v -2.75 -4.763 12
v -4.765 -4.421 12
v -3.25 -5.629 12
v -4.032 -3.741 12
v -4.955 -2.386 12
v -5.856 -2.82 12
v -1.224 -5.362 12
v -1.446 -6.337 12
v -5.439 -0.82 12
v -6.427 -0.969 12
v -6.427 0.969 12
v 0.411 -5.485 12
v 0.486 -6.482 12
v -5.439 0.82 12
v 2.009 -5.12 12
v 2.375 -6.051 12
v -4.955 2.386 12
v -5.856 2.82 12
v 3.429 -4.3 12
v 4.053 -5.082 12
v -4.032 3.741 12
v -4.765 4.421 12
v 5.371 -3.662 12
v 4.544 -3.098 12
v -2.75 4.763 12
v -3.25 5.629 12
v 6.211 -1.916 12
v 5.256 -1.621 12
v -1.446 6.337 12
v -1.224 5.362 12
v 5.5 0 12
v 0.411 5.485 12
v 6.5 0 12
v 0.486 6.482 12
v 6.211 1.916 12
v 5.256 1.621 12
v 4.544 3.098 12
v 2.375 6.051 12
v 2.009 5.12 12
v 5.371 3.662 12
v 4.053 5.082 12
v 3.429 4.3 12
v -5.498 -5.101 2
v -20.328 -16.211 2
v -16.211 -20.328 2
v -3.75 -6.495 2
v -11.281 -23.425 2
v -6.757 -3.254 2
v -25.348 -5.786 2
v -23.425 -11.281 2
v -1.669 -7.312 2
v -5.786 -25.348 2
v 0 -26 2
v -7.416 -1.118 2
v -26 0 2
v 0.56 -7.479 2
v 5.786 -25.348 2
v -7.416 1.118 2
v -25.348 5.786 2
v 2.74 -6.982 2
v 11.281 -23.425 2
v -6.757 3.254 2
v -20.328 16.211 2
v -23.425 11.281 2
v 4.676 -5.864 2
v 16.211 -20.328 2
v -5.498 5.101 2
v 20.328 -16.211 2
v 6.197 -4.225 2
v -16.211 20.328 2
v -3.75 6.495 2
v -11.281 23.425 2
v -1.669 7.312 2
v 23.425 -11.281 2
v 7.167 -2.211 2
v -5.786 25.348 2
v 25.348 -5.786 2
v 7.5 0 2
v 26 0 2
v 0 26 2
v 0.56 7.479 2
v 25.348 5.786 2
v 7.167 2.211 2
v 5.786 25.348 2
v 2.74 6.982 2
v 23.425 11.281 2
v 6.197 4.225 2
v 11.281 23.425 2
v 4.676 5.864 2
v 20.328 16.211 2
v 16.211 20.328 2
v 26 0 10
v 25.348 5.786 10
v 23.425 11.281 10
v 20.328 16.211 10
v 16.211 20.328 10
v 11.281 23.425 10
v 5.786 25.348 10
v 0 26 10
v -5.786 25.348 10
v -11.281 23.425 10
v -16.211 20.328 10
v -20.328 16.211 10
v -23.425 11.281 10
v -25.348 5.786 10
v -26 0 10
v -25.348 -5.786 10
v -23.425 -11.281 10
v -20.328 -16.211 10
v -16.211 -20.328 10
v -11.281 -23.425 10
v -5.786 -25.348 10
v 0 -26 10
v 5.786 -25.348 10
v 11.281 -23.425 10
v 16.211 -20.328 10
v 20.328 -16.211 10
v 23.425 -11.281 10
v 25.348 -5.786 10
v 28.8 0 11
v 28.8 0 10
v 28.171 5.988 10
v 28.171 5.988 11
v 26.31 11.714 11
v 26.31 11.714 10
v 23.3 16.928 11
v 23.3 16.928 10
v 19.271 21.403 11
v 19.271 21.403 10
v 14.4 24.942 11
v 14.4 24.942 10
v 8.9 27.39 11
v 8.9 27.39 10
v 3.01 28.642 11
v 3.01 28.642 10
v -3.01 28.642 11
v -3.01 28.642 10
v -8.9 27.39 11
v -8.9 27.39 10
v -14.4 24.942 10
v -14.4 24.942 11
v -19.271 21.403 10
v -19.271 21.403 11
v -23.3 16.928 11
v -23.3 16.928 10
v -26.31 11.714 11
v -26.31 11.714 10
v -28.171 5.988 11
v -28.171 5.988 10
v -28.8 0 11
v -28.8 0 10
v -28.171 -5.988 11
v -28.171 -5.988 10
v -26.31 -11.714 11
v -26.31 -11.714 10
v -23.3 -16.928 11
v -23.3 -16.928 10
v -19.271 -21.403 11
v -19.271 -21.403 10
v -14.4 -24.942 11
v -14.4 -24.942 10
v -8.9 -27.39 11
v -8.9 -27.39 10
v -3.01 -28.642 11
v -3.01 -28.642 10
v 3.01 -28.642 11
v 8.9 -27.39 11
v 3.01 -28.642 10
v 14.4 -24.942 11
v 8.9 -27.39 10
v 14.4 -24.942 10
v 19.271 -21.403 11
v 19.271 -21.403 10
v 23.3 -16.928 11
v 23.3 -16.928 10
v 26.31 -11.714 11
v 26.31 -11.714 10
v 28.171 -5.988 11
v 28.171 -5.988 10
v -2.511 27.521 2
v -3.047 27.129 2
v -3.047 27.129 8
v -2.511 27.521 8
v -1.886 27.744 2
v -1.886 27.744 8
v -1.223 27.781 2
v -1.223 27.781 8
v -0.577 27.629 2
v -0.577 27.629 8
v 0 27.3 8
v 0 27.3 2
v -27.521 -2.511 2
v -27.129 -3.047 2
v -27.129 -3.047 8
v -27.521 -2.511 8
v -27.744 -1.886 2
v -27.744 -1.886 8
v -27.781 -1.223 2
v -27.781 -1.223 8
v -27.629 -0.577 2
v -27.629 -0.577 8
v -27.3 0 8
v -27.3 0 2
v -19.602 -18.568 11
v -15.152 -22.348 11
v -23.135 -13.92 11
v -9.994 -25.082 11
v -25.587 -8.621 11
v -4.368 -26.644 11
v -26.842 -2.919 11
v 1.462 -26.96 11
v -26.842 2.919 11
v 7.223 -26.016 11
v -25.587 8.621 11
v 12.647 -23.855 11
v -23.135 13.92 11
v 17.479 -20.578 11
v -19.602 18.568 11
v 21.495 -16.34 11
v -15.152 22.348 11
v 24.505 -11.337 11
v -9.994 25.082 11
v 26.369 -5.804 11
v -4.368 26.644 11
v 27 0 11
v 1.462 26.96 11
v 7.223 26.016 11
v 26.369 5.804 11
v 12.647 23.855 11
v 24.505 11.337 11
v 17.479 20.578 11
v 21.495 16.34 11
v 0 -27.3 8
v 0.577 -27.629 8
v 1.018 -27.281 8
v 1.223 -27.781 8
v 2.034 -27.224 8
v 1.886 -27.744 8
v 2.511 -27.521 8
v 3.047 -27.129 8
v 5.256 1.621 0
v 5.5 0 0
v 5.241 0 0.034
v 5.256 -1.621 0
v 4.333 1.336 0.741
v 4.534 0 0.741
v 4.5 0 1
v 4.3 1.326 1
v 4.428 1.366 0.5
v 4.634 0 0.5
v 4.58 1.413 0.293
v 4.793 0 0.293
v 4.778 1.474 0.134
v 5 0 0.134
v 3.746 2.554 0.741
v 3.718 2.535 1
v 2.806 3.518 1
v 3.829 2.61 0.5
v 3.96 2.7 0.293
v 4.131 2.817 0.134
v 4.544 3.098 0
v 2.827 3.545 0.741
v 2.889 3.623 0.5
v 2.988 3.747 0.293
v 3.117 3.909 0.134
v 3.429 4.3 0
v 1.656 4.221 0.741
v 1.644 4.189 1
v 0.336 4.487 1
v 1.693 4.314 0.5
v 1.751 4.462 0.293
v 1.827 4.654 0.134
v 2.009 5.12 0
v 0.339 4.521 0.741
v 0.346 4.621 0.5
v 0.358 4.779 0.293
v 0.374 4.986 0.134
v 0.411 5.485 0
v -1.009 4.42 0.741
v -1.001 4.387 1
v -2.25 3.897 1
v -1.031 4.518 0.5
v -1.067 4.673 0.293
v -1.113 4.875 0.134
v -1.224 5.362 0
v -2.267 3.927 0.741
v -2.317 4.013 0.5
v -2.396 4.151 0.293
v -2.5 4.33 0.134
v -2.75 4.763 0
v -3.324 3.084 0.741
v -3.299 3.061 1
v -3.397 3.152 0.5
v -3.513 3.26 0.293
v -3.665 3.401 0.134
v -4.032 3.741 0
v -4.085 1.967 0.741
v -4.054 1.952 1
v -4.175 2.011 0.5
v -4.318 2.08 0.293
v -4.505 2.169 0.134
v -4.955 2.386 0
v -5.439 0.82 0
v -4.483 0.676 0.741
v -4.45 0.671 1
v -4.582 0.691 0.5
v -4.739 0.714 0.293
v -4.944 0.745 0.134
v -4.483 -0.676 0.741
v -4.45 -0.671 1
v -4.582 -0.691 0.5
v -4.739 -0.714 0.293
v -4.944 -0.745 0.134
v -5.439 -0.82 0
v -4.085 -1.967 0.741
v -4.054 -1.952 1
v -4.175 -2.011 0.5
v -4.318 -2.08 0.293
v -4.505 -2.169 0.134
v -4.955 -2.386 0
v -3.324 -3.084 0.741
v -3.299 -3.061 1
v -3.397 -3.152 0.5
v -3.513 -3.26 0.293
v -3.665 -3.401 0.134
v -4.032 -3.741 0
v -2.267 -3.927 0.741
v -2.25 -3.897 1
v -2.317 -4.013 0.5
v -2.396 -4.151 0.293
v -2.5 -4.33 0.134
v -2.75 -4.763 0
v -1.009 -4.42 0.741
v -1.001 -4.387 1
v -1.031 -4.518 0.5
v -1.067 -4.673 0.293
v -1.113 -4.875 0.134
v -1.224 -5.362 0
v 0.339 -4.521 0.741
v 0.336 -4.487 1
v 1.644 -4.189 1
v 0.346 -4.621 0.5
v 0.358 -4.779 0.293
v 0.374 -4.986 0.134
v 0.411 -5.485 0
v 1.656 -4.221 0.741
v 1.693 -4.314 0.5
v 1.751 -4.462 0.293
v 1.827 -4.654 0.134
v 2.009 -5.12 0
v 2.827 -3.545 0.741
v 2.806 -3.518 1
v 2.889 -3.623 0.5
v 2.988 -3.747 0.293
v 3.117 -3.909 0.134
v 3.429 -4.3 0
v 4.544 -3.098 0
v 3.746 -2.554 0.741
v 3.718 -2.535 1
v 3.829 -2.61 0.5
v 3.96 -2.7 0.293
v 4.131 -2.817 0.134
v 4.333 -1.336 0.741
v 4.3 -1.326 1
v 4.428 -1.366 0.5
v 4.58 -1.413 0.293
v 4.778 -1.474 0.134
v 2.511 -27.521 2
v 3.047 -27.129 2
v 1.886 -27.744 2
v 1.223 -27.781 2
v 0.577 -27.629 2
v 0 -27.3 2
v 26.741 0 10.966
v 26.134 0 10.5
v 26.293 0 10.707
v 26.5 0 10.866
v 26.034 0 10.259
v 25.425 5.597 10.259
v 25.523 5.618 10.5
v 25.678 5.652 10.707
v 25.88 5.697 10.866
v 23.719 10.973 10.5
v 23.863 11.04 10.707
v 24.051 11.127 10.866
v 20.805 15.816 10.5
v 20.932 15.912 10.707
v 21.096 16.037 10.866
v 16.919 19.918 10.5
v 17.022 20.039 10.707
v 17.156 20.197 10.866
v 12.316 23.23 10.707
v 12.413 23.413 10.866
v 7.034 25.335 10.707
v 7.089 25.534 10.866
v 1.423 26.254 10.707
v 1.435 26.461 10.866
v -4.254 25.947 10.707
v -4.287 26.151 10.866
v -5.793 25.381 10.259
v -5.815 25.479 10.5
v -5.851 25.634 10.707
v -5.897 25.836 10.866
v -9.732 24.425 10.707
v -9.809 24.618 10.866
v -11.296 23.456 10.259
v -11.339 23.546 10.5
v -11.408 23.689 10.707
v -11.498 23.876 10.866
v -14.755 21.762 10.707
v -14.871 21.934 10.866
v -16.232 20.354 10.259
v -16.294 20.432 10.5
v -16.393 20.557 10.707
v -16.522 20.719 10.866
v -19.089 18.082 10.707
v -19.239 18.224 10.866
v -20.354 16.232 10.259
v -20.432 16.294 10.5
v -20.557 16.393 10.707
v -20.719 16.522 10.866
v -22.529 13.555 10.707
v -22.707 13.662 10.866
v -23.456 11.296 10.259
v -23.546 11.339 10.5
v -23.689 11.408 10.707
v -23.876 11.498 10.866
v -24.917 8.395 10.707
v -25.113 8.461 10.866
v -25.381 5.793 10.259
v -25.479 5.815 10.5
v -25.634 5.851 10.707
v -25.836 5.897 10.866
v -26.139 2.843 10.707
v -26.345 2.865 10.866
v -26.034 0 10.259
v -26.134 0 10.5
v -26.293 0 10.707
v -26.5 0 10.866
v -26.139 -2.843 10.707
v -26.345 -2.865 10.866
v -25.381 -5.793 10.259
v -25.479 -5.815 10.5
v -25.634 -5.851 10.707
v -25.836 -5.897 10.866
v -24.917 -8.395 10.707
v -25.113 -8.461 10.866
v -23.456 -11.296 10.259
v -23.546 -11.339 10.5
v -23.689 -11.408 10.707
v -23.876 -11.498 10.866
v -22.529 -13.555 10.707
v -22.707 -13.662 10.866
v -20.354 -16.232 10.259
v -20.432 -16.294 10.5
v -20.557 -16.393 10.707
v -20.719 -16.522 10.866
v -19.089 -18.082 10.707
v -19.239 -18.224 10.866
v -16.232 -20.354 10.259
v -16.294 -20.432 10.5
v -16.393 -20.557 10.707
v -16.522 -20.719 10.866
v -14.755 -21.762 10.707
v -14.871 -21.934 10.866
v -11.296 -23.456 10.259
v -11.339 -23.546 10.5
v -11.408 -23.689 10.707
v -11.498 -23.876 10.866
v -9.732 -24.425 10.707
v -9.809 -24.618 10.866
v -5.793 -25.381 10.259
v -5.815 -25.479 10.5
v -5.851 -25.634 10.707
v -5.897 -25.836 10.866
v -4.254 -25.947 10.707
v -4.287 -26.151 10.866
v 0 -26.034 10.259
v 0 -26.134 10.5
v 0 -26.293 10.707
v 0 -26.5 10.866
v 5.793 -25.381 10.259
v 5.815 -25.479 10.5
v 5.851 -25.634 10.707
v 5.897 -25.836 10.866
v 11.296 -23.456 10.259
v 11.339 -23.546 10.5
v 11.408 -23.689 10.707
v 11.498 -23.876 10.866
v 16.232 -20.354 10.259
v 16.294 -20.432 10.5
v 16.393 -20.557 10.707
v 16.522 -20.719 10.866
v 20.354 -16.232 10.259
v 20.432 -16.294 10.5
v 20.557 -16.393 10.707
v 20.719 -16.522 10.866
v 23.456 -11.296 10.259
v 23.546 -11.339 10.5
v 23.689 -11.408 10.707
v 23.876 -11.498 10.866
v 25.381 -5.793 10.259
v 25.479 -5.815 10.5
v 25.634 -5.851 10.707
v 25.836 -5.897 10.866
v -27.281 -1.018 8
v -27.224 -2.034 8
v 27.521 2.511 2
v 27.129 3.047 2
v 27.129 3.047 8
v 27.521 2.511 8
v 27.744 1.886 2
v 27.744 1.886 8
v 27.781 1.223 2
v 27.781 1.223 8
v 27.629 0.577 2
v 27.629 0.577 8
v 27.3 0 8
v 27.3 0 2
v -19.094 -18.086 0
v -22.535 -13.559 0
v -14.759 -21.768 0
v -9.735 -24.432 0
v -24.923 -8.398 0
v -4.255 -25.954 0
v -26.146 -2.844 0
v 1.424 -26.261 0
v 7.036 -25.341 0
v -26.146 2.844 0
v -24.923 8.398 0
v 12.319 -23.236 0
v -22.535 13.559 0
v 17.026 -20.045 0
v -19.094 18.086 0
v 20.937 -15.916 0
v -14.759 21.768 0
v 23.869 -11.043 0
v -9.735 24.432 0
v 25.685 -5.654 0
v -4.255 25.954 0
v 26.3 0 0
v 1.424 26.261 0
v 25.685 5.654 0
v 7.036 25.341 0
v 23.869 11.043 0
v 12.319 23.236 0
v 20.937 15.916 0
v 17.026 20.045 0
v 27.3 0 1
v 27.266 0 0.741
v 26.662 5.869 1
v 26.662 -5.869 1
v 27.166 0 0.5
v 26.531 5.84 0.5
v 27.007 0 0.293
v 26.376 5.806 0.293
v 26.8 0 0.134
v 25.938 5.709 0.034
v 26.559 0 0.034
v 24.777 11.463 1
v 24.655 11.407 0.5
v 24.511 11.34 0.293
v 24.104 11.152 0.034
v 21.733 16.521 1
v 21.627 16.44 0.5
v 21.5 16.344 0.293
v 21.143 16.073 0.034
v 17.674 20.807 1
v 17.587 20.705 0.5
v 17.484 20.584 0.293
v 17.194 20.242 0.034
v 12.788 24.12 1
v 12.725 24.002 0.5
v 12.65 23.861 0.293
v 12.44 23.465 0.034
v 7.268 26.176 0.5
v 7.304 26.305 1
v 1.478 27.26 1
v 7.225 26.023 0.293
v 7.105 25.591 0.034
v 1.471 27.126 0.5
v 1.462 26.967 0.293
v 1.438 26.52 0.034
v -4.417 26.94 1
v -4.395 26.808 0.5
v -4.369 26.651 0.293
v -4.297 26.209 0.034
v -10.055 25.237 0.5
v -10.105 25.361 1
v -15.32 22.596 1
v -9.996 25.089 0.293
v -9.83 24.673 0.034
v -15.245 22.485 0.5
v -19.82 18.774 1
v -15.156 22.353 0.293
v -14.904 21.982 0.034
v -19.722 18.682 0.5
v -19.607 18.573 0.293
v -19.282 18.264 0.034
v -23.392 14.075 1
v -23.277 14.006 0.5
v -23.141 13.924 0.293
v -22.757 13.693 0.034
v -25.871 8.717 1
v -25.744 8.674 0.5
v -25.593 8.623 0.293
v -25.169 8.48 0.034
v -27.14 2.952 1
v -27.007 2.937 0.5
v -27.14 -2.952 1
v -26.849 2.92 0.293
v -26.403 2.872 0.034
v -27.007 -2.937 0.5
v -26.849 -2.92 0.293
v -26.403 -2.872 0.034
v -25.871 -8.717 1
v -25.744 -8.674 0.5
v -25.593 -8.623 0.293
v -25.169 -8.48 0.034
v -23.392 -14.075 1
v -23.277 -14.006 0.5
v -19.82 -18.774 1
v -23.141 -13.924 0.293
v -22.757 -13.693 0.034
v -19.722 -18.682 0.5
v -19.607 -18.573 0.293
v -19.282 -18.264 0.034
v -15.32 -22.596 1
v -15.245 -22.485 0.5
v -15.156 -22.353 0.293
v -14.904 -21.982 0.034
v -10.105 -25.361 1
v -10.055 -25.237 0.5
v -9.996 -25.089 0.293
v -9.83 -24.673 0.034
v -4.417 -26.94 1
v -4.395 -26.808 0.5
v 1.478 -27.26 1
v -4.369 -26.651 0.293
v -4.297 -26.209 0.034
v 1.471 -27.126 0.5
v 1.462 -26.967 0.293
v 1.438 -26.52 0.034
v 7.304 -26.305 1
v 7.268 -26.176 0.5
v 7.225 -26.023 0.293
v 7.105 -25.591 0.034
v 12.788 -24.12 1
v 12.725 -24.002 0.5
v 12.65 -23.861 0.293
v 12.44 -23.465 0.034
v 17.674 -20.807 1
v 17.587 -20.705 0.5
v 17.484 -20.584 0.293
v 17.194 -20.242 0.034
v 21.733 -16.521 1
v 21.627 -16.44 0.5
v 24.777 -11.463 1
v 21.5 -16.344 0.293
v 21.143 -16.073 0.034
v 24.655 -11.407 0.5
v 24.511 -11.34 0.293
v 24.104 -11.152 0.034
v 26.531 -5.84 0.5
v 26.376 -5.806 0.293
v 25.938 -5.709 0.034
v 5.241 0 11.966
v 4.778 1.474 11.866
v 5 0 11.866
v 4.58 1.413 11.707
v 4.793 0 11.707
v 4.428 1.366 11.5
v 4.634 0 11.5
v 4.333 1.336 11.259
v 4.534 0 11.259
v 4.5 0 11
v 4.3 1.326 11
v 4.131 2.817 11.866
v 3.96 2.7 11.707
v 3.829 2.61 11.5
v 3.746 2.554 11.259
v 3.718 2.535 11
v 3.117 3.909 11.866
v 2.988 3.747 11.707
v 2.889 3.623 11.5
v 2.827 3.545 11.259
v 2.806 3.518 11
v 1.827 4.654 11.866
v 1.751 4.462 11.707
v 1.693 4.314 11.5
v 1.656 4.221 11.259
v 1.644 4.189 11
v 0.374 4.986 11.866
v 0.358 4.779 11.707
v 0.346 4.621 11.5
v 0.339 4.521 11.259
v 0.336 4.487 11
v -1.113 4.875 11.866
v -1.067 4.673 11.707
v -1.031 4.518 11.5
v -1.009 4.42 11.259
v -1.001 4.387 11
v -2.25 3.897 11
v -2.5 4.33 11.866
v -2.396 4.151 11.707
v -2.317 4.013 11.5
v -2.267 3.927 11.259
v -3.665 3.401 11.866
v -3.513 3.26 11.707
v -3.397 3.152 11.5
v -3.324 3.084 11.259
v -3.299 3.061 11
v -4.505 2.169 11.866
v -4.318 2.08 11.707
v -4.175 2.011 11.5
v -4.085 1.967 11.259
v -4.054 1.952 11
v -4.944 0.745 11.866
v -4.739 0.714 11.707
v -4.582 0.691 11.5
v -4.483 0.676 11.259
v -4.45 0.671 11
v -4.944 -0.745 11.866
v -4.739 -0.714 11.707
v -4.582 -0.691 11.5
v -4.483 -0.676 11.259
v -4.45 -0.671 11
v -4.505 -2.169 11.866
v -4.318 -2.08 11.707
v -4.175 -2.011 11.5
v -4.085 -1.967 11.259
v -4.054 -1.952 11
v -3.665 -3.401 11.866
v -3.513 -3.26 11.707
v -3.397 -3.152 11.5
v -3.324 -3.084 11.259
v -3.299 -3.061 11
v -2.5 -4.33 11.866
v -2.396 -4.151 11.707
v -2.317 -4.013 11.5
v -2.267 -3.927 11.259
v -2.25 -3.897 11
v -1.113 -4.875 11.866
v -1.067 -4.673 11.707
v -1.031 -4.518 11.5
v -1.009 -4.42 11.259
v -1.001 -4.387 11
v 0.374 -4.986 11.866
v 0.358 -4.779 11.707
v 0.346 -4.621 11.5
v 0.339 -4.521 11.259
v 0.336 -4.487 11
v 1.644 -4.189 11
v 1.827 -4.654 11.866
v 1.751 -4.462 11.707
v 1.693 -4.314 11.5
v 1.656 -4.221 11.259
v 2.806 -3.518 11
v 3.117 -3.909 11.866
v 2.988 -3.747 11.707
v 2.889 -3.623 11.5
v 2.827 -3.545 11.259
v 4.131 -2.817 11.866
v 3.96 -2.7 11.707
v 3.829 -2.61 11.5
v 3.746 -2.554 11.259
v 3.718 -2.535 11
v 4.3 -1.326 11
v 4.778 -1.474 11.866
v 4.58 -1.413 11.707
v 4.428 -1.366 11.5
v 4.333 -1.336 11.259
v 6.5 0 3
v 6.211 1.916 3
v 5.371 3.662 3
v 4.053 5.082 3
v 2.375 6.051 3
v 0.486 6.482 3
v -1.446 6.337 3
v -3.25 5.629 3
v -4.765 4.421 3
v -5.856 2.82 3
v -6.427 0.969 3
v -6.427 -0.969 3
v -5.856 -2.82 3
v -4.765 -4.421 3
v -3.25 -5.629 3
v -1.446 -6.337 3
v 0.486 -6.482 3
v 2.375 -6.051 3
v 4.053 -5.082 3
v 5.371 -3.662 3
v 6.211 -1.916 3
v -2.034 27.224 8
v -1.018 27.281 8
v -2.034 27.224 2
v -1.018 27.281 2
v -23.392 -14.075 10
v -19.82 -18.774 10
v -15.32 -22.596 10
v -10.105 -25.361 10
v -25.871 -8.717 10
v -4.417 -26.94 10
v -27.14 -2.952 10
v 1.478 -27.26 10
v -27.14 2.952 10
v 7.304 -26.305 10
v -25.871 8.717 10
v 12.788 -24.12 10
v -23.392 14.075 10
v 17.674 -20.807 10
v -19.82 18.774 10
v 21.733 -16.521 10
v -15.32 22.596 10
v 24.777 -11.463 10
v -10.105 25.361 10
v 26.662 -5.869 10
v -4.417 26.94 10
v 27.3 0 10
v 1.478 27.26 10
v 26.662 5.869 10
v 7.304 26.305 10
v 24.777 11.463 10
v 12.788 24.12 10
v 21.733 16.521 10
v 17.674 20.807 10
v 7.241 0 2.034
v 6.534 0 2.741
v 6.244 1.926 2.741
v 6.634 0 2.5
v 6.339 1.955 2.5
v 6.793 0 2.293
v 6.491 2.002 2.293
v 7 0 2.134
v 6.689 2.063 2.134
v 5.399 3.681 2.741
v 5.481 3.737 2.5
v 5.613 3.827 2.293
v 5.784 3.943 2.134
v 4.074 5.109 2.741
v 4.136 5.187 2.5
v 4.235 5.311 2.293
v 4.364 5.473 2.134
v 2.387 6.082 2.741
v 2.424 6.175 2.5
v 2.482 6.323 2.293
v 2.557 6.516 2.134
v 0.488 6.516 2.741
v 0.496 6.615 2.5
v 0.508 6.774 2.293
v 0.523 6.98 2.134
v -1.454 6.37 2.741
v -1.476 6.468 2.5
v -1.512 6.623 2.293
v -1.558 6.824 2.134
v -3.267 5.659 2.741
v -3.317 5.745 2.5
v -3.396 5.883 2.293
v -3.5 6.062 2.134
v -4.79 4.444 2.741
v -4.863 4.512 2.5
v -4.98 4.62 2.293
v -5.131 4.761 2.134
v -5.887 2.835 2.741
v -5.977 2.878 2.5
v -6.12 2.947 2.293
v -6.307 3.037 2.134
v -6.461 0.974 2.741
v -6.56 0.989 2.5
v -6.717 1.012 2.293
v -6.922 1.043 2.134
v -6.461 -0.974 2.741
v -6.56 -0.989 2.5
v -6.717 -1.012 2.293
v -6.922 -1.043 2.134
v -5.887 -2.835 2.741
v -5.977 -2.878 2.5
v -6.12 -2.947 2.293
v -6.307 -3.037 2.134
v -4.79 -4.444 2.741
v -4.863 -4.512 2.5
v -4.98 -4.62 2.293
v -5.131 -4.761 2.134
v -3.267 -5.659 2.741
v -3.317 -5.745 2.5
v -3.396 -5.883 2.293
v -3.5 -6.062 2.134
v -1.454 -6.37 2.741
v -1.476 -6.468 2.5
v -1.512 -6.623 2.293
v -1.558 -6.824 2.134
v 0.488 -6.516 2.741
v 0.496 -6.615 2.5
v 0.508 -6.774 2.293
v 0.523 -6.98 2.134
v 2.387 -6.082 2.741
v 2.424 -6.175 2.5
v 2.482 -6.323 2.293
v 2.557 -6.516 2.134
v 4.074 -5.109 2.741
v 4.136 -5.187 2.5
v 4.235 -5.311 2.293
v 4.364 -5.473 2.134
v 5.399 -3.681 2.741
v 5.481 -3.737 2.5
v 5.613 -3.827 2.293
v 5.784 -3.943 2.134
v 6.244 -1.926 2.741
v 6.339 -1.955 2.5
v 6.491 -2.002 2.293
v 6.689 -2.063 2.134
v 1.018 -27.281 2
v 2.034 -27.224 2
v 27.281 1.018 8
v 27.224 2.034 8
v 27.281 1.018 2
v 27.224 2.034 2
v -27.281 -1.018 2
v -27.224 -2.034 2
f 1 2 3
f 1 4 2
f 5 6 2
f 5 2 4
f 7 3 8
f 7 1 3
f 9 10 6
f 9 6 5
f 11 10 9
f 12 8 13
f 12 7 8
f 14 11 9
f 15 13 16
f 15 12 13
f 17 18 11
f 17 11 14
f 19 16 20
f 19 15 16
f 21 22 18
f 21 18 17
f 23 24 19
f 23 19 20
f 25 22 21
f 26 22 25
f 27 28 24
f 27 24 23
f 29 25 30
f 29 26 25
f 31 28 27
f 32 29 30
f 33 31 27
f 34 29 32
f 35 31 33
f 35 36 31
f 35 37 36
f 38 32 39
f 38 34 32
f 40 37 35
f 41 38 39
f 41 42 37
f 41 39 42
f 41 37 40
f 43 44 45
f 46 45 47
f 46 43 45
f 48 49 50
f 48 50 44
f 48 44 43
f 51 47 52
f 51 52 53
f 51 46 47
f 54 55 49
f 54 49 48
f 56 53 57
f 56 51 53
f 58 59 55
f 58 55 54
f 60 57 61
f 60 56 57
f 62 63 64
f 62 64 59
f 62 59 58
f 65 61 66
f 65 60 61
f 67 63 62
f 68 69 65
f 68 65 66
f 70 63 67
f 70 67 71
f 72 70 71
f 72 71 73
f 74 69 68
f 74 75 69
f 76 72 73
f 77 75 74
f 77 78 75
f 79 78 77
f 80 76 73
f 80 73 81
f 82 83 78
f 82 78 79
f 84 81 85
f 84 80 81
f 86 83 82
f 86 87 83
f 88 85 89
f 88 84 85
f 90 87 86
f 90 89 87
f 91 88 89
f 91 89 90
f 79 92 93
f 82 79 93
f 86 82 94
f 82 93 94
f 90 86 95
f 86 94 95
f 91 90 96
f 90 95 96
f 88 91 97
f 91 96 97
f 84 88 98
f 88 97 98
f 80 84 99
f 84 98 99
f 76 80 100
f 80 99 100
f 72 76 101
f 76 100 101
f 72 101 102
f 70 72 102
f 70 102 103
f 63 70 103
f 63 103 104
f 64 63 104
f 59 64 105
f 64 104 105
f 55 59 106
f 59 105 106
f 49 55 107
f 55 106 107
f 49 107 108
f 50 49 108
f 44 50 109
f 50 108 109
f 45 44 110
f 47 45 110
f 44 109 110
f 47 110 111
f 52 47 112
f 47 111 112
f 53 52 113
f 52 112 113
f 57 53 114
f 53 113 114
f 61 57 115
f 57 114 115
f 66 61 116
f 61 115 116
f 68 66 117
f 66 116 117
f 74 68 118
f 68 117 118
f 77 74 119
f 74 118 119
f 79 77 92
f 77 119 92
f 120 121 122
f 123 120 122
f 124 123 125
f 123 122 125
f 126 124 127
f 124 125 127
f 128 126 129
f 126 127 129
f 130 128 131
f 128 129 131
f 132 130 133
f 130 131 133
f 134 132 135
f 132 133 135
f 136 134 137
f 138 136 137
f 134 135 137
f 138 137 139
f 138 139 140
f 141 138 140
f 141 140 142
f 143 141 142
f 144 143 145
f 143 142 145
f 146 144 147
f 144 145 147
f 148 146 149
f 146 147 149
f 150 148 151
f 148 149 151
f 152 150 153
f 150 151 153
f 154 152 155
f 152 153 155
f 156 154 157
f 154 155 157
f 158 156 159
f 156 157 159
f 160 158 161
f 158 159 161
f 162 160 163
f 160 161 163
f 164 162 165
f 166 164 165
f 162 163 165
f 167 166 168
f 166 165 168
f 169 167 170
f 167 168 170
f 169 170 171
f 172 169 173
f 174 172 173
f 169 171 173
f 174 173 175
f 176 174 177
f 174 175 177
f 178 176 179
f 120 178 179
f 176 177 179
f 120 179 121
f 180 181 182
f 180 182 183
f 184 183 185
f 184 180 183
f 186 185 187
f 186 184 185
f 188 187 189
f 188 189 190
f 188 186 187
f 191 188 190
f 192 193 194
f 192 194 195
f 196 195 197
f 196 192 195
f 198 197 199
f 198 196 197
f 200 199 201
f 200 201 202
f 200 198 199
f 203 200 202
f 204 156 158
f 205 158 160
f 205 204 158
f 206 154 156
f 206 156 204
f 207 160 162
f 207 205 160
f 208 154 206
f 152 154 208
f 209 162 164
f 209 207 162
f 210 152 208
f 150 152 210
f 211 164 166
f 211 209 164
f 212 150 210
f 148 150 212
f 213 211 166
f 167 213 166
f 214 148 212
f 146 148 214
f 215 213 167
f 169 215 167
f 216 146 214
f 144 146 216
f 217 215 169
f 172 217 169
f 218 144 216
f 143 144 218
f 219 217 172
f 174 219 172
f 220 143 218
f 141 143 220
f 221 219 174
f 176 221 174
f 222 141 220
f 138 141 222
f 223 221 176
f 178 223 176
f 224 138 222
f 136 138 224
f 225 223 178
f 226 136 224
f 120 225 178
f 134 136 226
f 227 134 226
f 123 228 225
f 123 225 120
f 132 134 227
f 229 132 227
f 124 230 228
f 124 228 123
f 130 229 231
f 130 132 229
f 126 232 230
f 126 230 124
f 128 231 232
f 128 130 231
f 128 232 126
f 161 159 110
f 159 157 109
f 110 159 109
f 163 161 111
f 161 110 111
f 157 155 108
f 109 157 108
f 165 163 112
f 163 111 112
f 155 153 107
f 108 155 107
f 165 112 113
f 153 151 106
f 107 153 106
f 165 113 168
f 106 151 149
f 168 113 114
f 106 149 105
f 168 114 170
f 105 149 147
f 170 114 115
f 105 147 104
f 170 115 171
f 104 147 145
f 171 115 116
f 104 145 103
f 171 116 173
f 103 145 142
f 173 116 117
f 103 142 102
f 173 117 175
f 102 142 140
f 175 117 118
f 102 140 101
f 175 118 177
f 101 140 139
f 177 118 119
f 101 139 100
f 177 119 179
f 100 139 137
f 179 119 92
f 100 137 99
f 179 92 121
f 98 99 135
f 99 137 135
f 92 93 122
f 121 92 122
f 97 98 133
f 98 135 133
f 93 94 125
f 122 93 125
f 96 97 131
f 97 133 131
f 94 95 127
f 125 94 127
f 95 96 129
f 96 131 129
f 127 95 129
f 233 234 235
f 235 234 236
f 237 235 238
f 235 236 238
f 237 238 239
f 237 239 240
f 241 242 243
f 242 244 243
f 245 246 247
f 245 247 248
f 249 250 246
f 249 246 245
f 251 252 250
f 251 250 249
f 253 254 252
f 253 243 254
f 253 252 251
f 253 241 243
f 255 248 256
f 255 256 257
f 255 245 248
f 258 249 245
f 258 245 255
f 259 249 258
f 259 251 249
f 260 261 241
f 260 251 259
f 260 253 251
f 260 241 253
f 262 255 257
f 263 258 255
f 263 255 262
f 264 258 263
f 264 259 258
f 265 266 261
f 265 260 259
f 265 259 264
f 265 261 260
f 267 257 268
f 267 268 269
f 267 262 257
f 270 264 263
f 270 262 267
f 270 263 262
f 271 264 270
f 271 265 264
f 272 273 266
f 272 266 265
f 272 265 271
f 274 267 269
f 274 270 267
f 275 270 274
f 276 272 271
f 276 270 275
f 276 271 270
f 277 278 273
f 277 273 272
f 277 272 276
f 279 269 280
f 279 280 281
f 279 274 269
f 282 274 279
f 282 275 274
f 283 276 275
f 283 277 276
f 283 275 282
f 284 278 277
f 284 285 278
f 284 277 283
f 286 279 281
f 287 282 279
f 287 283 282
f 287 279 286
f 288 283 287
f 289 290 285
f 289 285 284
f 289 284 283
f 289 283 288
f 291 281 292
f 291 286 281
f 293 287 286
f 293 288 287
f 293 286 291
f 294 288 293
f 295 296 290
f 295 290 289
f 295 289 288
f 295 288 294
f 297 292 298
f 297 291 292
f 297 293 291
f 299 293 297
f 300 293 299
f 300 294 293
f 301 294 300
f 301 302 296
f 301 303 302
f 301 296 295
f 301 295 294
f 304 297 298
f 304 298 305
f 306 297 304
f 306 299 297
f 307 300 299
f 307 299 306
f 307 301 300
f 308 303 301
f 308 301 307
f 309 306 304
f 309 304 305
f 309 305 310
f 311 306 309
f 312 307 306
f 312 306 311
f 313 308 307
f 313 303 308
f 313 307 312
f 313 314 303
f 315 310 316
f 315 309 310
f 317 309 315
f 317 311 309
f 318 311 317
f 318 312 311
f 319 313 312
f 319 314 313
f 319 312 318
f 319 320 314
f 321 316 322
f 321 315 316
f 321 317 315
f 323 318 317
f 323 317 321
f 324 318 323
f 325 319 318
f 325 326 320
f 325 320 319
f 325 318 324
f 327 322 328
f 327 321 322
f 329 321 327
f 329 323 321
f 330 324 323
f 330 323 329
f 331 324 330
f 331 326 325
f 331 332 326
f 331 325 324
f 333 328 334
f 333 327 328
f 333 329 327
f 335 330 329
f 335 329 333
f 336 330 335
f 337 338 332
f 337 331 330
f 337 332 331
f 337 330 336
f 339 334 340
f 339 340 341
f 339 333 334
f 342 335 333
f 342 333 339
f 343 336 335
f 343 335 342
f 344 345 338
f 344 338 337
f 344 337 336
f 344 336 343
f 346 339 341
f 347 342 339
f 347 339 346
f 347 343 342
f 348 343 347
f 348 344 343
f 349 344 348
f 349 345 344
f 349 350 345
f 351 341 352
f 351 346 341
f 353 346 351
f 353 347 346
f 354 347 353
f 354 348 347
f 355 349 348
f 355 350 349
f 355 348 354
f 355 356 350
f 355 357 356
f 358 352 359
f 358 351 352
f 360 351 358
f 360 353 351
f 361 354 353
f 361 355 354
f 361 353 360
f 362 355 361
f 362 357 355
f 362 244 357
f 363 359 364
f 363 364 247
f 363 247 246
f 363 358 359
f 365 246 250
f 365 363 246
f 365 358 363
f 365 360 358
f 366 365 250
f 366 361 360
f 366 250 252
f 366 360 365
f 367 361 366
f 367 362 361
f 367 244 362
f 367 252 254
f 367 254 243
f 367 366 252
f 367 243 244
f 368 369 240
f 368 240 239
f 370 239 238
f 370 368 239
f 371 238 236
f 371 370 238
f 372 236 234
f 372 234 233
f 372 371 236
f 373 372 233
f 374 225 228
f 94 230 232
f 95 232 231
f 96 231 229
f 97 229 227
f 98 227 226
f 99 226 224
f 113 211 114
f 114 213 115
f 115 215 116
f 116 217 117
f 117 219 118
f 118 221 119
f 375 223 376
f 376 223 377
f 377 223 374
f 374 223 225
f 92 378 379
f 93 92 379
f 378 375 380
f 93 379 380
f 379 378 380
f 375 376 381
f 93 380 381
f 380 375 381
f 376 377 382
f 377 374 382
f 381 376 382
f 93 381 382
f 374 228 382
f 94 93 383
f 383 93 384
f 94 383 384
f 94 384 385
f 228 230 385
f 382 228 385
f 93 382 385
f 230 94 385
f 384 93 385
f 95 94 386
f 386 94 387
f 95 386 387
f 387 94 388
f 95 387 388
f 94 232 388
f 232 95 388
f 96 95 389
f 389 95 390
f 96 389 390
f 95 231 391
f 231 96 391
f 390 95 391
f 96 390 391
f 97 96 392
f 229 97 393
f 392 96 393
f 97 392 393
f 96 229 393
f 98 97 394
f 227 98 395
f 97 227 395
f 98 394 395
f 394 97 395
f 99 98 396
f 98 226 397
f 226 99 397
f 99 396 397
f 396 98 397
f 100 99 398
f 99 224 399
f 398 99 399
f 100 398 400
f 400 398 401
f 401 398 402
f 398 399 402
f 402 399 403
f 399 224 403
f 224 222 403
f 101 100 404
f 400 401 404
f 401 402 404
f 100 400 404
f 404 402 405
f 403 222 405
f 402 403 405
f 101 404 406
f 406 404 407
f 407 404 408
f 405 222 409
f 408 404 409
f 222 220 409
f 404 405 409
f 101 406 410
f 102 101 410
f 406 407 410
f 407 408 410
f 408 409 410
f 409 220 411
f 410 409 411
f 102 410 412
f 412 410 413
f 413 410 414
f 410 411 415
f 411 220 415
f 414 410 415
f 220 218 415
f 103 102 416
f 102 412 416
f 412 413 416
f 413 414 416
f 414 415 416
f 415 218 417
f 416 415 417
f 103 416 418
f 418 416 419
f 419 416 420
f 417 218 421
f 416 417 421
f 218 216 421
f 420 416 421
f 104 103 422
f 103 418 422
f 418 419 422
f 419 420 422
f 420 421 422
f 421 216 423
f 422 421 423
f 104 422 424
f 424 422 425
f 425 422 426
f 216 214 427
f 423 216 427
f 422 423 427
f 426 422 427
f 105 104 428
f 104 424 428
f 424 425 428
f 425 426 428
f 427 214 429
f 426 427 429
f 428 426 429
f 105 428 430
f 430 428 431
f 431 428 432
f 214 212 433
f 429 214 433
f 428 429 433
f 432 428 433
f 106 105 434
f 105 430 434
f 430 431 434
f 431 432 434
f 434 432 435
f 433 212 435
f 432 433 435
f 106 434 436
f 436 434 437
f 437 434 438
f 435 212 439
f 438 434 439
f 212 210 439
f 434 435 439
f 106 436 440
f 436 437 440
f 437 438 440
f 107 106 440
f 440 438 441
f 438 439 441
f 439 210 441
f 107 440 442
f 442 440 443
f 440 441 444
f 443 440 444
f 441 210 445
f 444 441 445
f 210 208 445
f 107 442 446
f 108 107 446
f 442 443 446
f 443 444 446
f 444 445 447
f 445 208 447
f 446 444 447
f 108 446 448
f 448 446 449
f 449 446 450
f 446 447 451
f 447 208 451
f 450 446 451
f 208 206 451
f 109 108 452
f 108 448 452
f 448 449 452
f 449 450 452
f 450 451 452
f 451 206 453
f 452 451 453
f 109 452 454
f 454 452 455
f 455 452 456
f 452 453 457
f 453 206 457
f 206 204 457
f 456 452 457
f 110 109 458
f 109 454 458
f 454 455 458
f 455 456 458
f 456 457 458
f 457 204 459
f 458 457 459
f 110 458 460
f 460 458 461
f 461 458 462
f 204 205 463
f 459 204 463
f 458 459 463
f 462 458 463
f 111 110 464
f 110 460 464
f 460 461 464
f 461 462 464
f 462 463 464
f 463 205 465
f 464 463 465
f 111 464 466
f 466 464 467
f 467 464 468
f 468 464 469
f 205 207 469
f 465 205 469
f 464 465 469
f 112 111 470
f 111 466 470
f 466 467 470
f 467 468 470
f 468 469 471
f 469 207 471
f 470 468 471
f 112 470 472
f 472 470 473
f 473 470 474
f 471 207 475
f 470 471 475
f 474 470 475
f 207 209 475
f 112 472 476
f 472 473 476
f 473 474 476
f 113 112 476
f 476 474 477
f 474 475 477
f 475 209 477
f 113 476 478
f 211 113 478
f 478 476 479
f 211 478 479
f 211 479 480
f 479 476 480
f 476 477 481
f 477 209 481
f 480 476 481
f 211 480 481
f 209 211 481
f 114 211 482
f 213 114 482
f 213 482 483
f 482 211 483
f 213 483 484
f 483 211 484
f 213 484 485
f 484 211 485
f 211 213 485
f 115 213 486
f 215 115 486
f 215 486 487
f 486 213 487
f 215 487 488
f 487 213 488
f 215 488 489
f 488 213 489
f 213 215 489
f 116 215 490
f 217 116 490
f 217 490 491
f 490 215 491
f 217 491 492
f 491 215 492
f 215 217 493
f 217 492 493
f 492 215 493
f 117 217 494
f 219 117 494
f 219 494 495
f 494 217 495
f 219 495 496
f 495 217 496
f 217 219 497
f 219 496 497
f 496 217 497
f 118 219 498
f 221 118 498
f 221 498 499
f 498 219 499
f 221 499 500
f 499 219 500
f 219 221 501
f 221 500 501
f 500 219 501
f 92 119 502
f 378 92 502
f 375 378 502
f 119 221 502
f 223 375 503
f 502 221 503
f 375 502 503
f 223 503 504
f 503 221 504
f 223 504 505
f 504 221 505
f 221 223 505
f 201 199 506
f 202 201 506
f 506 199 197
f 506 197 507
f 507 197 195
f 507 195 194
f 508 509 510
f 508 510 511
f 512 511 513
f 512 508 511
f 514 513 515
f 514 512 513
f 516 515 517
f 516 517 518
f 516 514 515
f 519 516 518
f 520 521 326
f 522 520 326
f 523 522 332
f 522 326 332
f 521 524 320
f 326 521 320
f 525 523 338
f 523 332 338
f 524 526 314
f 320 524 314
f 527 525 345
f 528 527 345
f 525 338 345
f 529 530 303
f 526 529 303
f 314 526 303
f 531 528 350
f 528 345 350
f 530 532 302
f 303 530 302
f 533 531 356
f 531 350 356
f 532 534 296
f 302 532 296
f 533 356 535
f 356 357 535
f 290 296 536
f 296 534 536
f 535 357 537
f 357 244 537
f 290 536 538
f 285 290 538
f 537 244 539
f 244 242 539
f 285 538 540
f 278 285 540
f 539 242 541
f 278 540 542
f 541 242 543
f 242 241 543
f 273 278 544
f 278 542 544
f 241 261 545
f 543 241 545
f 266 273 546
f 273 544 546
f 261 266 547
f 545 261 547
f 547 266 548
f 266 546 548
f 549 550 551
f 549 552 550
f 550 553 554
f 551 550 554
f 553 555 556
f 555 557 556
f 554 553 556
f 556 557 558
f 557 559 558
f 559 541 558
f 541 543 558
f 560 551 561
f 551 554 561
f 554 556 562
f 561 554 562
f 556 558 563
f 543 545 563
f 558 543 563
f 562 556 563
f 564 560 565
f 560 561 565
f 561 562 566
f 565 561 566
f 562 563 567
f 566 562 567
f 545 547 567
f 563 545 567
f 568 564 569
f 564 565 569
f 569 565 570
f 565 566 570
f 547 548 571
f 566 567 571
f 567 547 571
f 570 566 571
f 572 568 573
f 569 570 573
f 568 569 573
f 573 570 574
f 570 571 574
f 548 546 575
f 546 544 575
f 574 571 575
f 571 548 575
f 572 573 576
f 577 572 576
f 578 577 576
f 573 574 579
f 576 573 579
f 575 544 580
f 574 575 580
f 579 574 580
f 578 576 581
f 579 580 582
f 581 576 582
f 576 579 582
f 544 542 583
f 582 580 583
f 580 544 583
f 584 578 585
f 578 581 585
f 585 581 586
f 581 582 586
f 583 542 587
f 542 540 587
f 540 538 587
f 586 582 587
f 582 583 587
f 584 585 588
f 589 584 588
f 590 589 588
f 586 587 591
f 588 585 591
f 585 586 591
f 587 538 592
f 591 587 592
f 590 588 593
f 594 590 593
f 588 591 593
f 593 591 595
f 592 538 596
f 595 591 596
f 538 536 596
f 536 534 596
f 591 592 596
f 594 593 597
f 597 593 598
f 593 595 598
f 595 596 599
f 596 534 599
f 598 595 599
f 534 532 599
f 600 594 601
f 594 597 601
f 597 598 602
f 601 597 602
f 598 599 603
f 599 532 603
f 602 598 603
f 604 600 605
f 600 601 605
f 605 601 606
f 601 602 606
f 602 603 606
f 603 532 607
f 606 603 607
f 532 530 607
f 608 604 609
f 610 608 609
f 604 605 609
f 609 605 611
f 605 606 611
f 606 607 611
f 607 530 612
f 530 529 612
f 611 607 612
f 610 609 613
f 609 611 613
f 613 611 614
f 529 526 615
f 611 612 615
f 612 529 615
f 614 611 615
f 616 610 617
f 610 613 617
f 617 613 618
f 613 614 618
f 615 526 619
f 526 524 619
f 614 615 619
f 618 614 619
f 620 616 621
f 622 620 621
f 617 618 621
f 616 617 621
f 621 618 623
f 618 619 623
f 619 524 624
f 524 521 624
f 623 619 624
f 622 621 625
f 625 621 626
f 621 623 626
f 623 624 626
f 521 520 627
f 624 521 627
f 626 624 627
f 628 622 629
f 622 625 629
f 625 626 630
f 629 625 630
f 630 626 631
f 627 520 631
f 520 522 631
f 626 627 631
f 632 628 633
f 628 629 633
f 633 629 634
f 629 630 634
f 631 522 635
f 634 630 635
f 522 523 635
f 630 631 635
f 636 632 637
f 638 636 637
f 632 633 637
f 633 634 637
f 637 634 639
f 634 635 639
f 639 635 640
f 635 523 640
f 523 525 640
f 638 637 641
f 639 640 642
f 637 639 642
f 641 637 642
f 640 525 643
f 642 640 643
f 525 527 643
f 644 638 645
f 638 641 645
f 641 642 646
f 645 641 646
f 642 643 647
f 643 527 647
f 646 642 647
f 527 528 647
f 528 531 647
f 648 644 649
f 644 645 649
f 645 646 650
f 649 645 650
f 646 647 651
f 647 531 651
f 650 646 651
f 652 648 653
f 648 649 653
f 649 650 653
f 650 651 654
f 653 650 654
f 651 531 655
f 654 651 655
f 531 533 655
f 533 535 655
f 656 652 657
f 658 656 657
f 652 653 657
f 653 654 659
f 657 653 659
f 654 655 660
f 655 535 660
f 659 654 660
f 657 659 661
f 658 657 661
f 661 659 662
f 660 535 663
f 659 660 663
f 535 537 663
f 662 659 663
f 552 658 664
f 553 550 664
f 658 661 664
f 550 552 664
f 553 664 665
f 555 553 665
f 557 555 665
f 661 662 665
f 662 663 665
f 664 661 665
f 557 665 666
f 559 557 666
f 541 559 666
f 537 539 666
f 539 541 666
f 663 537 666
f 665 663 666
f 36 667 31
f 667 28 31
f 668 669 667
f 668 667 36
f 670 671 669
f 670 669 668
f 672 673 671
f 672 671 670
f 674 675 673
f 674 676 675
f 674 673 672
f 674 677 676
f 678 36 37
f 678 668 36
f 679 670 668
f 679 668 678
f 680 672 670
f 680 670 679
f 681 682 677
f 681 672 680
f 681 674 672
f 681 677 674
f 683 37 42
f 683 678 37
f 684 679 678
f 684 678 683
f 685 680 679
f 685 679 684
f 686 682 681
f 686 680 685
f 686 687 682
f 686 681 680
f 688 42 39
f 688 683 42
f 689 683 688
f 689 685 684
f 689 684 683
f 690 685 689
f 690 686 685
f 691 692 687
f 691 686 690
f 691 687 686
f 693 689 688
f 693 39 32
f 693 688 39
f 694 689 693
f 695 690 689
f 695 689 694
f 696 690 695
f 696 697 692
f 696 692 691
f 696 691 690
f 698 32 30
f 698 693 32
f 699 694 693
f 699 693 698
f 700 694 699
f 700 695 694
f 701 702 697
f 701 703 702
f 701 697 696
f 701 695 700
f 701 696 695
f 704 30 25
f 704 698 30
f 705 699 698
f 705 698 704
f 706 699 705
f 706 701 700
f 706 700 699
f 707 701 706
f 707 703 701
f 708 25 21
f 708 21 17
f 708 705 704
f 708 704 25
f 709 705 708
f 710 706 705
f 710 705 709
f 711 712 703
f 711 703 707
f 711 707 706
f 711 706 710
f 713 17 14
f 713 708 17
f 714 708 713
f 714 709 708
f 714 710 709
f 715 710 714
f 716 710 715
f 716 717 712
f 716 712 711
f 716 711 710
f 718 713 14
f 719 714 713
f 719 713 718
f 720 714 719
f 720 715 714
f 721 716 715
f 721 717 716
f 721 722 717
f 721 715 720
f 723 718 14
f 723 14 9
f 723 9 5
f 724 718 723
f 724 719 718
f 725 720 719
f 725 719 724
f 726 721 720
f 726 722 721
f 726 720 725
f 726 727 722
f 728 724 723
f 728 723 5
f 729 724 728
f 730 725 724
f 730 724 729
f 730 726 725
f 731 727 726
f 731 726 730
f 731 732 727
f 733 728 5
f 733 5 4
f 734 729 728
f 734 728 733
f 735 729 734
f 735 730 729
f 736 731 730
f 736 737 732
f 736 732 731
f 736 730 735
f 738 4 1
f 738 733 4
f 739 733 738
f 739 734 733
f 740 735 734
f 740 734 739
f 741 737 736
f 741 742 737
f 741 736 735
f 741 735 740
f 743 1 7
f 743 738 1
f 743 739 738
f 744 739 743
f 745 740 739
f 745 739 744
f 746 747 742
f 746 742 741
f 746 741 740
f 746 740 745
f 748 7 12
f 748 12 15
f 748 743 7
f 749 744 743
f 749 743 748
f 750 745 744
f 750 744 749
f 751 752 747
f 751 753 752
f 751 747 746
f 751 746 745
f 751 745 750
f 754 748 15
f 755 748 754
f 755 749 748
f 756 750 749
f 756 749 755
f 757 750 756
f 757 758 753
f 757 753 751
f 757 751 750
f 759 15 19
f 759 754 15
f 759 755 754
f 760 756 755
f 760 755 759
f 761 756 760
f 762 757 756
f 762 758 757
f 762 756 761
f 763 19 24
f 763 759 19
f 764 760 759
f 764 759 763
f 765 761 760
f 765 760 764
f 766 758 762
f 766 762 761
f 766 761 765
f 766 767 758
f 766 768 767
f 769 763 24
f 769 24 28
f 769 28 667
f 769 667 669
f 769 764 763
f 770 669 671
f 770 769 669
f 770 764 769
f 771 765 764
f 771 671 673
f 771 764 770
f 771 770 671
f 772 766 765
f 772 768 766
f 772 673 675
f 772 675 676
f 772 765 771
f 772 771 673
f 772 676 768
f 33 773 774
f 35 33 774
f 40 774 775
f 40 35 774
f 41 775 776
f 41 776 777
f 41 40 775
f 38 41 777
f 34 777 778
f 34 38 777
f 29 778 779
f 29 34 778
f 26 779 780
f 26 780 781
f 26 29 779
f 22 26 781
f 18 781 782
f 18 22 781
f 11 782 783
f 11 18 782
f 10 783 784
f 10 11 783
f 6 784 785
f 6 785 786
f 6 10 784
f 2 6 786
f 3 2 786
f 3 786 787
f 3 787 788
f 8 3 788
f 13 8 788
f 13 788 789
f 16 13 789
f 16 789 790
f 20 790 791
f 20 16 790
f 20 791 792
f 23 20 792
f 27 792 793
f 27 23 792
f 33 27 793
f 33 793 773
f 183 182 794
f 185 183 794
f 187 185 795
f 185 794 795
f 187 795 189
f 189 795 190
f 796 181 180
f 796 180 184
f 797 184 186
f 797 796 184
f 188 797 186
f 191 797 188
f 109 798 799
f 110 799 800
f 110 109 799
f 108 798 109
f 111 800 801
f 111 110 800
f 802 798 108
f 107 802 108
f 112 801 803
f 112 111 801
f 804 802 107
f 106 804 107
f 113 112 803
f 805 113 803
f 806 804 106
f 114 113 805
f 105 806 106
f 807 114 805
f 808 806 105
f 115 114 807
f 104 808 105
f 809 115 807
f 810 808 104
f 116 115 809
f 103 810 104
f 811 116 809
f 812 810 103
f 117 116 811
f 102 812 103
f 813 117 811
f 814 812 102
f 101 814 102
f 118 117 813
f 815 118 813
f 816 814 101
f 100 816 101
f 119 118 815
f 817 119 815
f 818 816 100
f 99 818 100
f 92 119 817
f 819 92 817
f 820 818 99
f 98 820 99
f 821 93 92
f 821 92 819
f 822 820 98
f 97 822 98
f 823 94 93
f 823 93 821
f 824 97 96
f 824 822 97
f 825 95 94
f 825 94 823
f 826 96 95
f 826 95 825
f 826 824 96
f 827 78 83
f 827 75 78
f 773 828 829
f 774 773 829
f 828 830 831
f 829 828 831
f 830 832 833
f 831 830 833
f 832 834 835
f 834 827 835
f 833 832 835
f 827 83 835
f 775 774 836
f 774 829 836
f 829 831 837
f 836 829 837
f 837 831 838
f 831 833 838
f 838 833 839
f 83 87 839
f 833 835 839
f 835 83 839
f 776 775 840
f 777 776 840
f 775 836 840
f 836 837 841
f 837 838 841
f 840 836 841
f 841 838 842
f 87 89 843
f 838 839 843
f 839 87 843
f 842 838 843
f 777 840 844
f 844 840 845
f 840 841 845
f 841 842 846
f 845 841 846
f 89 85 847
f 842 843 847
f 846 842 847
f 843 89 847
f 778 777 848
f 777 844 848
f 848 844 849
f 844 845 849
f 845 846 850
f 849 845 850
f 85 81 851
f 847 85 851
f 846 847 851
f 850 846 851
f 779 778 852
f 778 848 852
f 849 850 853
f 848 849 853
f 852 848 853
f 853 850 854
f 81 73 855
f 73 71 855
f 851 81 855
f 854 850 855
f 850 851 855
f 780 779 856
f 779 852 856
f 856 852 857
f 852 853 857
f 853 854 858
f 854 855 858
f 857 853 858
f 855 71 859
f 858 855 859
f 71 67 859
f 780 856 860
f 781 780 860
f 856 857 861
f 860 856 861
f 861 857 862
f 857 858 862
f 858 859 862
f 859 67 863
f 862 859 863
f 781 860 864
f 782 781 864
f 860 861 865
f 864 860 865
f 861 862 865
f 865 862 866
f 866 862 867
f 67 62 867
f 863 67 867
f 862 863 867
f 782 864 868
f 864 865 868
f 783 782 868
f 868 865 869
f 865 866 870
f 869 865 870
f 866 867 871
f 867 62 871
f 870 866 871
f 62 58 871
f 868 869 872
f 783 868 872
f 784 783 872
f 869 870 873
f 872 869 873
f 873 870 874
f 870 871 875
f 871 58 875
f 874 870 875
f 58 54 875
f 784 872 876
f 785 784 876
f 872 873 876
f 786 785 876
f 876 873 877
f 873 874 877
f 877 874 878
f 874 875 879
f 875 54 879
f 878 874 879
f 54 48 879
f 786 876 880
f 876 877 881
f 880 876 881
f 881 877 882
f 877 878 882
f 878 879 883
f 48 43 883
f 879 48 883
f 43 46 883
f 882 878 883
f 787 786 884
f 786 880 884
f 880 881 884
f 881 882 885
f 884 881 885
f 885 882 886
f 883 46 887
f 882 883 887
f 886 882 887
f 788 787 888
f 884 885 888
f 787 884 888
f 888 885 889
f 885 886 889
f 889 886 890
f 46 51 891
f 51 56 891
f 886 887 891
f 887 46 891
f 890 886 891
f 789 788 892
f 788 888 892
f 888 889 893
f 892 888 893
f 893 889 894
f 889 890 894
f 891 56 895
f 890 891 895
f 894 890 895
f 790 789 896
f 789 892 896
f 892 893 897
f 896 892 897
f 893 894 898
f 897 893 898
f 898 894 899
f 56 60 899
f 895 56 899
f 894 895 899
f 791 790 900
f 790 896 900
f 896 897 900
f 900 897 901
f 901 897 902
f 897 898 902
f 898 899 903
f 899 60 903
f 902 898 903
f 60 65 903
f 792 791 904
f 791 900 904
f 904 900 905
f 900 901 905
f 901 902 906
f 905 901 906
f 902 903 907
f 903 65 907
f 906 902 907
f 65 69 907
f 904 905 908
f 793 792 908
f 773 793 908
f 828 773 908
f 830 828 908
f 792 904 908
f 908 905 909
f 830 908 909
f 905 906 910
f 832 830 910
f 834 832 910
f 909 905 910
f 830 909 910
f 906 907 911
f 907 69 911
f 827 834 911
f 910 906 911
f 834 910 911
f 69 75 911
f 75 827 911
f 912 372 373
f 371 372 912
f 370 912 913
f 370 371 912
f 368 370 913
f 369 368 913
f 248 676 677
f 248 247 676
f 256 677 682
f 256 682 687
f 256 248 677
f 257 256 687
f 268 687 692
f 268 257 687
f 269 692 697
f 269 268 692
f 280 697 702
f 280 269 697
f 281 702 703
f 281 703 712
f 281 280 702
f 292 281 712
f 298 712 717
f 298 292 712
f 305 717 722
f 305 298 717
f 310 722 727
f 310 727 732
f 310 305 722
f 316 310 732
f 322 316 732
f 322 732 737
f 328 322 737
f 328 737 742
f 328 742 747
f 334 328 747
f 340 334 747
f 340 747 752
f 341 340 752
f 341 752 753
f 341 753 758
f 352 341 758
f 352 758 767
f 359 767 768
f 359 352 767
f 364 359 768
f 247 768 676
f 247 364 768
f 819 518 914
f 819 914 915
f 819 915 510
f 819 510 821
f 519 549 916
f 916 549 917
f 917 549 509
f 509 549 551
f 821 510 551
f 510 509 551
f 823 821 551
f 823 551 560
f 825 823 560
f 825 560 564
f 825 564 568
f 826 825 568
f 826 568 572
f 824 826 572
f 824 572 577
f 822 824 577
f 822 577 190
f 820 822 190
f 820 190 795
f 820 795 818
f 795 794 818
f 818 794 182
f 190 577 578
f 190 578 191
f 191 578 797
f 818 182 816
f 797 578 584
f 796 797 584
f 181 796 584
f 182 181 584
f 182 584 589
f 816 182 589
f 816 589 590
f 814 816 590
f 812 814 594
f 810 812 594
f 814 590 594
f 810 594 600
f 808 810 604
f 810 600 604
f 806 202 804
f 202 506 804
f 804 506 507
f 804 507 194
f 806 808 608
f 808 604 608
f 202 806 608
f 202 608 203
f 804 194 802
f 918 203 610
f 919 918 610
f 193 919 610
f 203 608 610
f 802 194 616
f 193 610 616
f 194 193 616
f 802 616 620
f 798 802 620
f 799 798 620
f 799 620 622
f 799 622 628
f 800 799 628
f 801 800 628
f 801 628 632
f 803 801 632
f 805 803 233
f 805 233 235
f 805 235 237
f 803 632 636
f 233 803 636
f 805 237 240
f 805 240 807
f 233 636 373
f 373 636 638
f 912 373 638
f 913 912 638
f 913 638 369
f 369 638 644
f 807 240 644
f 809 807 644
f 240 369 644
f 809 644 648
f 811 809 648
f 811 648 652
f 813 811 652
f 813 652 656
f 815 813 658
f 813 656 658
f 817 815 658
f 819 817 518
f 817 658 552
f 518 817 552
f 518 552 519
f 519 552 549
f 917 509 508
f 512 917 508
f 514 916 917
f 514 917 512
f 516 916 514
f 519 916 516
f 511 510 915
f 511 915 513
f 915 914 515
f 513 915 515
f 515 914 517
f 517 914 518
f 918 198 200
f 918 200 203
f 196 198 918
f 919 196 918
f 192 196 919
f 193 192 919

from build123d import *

# Parameters (mm, degrees)
F0_R      = 27.3
F0_R_2    = 4.5
F1_DEPTH  = 10
F2_R      = 26
F2_R_2    = 6.5
F3_DEPTH  = 8
F4_R      = 28.8
F4_R_2    = 27.3
F4_R_3    = 26
F5_DEPTH  = 1
F6_R      = 6.5
F6_R_2    = 4.5
F7_DEPTH  = 2
F8_R      = 0.99999
F8_2_R    = 0.99999
F10_START = -2
F10_DEPTH = 6
F11_R     = 1


# Not quite as in the source:
# - a fillet or chamfer is up to 0.001 mm smaller than in the source, because OpenCascade refuses the exact size


with BuildPart() as f1:
    # F0 (on Top) → F1 (new body)
    with BuildSketch(Plane.XY):
        Circle(F0_R)
        Circle(F0_R_2, mode=Mode.SUBTRACT)
    extrude(amount=F1_DEPTH)

    # F2 (on face) → F3 (cut)
    with BuildSketch(Plane.XY.offset(10)):
        Circle(F2_R)
        Circle(F2_R_2, mode=Mode.SUBTRACT)
    extrude(amount=-F3_DEPTH, mode=Mode.SUBTRACT)

    # F6 (on face) → F7 (join)
    with BuildSketch(Plane.XY.offset(10)):
        Circle(F6_R)
        Circle(F6_R_2, mode=Mode.SUBTRACT)
    extrude(amount=F7_DEPTH)

    # F8 (radius 1 in the source; OpenCascade refuses exactly that, so slightly less here)
    f8_edges = [f1.edges().sort_by_distance(p)[0] for p in [
        (-4.5, 0, 0),
        (-4.5, 0, 12),
        (-6.5, 0, 2),
    ]]
    fillet(f8_edges, radius=F8_R)

    # F9 (on face) → F10 (join)
    with BuildSketch(Plane(origin=(0, 0, 0), x_dir=(1, 0, 0), z_dir=(0, 0, -1)).offset(F10_START)):
        with BuildLine():
            ThreePointArc((27.1294434502, -3.0468505187), (27.7866214105, -1.5554390509), (27.3, 0))
            ThreePointArc((27.3, 0), (27.257327512, -1.5258102454), (27.1294434502, -3.0468505187))
        make_face()
        with BuildLine():
            ThreePointArc((-27.3, 0), (-27.257327512, 1.5258102454), (-27.1294434502, 3.0468505187))
            ThreePointArc((-27.1294434502, 3.0468505187), (-27.7866214105, 1.5554390509), (-27.3, 0))
        make_face()
        with BuildLine():
            ThreePointArc((3.0468505187, 27.1294434502), (1.5554390509, 27.7866214105), (0, 27.3))
            ThreePointArc((0, 27.3), (1.5258102454, 27.257327512), (3.0468505187, 27.1294434502))
        make_face()
        with BuildLine():
            ThreePointArc((0, -27.3), (-1.5258102454, -27.257327512), (-3.0468505187, -27.1294434502))
            ThreePointArc((-3.0468505187, -27.1294434502), (-1.5554390509, -27.7866214105), (0, -27.3))
        make_face()
    extrude(amount=-F10_DEPTH)

    # F11
    f11_edges = [f1.edges().sort_by_distance(p)[0] for p in [
        (-27.3, 0, 0),
    ]]
    fillet(f11_edges, radius=F11_R)


with BuildPart() as f5:
    # F4 (on face) → F5 (new body)
    with BuildSketch(Plane.XY.offset(10)):
        Circle(F4_R)
        Circle(F4_R_2, mode=Mode.SUBTRACT)
        Circle(F4_R_2)
        Circle(F4_R_3, mode=Mode.SUBTRACT)
    extrude(amount=F5_DEPTH)

    # F8#2 (radius 1 in the source; OpenCascade refuses exactly that, so slightly less here)
    f8_2_edges = [f5.edges().sort_by_distance(p)[0] for p in [
        (-26, 0, 11),
    ]]
    fillet(f8_2_edges, radius=F8_2_R)


solid = Compound([f1.part, f5.part])
